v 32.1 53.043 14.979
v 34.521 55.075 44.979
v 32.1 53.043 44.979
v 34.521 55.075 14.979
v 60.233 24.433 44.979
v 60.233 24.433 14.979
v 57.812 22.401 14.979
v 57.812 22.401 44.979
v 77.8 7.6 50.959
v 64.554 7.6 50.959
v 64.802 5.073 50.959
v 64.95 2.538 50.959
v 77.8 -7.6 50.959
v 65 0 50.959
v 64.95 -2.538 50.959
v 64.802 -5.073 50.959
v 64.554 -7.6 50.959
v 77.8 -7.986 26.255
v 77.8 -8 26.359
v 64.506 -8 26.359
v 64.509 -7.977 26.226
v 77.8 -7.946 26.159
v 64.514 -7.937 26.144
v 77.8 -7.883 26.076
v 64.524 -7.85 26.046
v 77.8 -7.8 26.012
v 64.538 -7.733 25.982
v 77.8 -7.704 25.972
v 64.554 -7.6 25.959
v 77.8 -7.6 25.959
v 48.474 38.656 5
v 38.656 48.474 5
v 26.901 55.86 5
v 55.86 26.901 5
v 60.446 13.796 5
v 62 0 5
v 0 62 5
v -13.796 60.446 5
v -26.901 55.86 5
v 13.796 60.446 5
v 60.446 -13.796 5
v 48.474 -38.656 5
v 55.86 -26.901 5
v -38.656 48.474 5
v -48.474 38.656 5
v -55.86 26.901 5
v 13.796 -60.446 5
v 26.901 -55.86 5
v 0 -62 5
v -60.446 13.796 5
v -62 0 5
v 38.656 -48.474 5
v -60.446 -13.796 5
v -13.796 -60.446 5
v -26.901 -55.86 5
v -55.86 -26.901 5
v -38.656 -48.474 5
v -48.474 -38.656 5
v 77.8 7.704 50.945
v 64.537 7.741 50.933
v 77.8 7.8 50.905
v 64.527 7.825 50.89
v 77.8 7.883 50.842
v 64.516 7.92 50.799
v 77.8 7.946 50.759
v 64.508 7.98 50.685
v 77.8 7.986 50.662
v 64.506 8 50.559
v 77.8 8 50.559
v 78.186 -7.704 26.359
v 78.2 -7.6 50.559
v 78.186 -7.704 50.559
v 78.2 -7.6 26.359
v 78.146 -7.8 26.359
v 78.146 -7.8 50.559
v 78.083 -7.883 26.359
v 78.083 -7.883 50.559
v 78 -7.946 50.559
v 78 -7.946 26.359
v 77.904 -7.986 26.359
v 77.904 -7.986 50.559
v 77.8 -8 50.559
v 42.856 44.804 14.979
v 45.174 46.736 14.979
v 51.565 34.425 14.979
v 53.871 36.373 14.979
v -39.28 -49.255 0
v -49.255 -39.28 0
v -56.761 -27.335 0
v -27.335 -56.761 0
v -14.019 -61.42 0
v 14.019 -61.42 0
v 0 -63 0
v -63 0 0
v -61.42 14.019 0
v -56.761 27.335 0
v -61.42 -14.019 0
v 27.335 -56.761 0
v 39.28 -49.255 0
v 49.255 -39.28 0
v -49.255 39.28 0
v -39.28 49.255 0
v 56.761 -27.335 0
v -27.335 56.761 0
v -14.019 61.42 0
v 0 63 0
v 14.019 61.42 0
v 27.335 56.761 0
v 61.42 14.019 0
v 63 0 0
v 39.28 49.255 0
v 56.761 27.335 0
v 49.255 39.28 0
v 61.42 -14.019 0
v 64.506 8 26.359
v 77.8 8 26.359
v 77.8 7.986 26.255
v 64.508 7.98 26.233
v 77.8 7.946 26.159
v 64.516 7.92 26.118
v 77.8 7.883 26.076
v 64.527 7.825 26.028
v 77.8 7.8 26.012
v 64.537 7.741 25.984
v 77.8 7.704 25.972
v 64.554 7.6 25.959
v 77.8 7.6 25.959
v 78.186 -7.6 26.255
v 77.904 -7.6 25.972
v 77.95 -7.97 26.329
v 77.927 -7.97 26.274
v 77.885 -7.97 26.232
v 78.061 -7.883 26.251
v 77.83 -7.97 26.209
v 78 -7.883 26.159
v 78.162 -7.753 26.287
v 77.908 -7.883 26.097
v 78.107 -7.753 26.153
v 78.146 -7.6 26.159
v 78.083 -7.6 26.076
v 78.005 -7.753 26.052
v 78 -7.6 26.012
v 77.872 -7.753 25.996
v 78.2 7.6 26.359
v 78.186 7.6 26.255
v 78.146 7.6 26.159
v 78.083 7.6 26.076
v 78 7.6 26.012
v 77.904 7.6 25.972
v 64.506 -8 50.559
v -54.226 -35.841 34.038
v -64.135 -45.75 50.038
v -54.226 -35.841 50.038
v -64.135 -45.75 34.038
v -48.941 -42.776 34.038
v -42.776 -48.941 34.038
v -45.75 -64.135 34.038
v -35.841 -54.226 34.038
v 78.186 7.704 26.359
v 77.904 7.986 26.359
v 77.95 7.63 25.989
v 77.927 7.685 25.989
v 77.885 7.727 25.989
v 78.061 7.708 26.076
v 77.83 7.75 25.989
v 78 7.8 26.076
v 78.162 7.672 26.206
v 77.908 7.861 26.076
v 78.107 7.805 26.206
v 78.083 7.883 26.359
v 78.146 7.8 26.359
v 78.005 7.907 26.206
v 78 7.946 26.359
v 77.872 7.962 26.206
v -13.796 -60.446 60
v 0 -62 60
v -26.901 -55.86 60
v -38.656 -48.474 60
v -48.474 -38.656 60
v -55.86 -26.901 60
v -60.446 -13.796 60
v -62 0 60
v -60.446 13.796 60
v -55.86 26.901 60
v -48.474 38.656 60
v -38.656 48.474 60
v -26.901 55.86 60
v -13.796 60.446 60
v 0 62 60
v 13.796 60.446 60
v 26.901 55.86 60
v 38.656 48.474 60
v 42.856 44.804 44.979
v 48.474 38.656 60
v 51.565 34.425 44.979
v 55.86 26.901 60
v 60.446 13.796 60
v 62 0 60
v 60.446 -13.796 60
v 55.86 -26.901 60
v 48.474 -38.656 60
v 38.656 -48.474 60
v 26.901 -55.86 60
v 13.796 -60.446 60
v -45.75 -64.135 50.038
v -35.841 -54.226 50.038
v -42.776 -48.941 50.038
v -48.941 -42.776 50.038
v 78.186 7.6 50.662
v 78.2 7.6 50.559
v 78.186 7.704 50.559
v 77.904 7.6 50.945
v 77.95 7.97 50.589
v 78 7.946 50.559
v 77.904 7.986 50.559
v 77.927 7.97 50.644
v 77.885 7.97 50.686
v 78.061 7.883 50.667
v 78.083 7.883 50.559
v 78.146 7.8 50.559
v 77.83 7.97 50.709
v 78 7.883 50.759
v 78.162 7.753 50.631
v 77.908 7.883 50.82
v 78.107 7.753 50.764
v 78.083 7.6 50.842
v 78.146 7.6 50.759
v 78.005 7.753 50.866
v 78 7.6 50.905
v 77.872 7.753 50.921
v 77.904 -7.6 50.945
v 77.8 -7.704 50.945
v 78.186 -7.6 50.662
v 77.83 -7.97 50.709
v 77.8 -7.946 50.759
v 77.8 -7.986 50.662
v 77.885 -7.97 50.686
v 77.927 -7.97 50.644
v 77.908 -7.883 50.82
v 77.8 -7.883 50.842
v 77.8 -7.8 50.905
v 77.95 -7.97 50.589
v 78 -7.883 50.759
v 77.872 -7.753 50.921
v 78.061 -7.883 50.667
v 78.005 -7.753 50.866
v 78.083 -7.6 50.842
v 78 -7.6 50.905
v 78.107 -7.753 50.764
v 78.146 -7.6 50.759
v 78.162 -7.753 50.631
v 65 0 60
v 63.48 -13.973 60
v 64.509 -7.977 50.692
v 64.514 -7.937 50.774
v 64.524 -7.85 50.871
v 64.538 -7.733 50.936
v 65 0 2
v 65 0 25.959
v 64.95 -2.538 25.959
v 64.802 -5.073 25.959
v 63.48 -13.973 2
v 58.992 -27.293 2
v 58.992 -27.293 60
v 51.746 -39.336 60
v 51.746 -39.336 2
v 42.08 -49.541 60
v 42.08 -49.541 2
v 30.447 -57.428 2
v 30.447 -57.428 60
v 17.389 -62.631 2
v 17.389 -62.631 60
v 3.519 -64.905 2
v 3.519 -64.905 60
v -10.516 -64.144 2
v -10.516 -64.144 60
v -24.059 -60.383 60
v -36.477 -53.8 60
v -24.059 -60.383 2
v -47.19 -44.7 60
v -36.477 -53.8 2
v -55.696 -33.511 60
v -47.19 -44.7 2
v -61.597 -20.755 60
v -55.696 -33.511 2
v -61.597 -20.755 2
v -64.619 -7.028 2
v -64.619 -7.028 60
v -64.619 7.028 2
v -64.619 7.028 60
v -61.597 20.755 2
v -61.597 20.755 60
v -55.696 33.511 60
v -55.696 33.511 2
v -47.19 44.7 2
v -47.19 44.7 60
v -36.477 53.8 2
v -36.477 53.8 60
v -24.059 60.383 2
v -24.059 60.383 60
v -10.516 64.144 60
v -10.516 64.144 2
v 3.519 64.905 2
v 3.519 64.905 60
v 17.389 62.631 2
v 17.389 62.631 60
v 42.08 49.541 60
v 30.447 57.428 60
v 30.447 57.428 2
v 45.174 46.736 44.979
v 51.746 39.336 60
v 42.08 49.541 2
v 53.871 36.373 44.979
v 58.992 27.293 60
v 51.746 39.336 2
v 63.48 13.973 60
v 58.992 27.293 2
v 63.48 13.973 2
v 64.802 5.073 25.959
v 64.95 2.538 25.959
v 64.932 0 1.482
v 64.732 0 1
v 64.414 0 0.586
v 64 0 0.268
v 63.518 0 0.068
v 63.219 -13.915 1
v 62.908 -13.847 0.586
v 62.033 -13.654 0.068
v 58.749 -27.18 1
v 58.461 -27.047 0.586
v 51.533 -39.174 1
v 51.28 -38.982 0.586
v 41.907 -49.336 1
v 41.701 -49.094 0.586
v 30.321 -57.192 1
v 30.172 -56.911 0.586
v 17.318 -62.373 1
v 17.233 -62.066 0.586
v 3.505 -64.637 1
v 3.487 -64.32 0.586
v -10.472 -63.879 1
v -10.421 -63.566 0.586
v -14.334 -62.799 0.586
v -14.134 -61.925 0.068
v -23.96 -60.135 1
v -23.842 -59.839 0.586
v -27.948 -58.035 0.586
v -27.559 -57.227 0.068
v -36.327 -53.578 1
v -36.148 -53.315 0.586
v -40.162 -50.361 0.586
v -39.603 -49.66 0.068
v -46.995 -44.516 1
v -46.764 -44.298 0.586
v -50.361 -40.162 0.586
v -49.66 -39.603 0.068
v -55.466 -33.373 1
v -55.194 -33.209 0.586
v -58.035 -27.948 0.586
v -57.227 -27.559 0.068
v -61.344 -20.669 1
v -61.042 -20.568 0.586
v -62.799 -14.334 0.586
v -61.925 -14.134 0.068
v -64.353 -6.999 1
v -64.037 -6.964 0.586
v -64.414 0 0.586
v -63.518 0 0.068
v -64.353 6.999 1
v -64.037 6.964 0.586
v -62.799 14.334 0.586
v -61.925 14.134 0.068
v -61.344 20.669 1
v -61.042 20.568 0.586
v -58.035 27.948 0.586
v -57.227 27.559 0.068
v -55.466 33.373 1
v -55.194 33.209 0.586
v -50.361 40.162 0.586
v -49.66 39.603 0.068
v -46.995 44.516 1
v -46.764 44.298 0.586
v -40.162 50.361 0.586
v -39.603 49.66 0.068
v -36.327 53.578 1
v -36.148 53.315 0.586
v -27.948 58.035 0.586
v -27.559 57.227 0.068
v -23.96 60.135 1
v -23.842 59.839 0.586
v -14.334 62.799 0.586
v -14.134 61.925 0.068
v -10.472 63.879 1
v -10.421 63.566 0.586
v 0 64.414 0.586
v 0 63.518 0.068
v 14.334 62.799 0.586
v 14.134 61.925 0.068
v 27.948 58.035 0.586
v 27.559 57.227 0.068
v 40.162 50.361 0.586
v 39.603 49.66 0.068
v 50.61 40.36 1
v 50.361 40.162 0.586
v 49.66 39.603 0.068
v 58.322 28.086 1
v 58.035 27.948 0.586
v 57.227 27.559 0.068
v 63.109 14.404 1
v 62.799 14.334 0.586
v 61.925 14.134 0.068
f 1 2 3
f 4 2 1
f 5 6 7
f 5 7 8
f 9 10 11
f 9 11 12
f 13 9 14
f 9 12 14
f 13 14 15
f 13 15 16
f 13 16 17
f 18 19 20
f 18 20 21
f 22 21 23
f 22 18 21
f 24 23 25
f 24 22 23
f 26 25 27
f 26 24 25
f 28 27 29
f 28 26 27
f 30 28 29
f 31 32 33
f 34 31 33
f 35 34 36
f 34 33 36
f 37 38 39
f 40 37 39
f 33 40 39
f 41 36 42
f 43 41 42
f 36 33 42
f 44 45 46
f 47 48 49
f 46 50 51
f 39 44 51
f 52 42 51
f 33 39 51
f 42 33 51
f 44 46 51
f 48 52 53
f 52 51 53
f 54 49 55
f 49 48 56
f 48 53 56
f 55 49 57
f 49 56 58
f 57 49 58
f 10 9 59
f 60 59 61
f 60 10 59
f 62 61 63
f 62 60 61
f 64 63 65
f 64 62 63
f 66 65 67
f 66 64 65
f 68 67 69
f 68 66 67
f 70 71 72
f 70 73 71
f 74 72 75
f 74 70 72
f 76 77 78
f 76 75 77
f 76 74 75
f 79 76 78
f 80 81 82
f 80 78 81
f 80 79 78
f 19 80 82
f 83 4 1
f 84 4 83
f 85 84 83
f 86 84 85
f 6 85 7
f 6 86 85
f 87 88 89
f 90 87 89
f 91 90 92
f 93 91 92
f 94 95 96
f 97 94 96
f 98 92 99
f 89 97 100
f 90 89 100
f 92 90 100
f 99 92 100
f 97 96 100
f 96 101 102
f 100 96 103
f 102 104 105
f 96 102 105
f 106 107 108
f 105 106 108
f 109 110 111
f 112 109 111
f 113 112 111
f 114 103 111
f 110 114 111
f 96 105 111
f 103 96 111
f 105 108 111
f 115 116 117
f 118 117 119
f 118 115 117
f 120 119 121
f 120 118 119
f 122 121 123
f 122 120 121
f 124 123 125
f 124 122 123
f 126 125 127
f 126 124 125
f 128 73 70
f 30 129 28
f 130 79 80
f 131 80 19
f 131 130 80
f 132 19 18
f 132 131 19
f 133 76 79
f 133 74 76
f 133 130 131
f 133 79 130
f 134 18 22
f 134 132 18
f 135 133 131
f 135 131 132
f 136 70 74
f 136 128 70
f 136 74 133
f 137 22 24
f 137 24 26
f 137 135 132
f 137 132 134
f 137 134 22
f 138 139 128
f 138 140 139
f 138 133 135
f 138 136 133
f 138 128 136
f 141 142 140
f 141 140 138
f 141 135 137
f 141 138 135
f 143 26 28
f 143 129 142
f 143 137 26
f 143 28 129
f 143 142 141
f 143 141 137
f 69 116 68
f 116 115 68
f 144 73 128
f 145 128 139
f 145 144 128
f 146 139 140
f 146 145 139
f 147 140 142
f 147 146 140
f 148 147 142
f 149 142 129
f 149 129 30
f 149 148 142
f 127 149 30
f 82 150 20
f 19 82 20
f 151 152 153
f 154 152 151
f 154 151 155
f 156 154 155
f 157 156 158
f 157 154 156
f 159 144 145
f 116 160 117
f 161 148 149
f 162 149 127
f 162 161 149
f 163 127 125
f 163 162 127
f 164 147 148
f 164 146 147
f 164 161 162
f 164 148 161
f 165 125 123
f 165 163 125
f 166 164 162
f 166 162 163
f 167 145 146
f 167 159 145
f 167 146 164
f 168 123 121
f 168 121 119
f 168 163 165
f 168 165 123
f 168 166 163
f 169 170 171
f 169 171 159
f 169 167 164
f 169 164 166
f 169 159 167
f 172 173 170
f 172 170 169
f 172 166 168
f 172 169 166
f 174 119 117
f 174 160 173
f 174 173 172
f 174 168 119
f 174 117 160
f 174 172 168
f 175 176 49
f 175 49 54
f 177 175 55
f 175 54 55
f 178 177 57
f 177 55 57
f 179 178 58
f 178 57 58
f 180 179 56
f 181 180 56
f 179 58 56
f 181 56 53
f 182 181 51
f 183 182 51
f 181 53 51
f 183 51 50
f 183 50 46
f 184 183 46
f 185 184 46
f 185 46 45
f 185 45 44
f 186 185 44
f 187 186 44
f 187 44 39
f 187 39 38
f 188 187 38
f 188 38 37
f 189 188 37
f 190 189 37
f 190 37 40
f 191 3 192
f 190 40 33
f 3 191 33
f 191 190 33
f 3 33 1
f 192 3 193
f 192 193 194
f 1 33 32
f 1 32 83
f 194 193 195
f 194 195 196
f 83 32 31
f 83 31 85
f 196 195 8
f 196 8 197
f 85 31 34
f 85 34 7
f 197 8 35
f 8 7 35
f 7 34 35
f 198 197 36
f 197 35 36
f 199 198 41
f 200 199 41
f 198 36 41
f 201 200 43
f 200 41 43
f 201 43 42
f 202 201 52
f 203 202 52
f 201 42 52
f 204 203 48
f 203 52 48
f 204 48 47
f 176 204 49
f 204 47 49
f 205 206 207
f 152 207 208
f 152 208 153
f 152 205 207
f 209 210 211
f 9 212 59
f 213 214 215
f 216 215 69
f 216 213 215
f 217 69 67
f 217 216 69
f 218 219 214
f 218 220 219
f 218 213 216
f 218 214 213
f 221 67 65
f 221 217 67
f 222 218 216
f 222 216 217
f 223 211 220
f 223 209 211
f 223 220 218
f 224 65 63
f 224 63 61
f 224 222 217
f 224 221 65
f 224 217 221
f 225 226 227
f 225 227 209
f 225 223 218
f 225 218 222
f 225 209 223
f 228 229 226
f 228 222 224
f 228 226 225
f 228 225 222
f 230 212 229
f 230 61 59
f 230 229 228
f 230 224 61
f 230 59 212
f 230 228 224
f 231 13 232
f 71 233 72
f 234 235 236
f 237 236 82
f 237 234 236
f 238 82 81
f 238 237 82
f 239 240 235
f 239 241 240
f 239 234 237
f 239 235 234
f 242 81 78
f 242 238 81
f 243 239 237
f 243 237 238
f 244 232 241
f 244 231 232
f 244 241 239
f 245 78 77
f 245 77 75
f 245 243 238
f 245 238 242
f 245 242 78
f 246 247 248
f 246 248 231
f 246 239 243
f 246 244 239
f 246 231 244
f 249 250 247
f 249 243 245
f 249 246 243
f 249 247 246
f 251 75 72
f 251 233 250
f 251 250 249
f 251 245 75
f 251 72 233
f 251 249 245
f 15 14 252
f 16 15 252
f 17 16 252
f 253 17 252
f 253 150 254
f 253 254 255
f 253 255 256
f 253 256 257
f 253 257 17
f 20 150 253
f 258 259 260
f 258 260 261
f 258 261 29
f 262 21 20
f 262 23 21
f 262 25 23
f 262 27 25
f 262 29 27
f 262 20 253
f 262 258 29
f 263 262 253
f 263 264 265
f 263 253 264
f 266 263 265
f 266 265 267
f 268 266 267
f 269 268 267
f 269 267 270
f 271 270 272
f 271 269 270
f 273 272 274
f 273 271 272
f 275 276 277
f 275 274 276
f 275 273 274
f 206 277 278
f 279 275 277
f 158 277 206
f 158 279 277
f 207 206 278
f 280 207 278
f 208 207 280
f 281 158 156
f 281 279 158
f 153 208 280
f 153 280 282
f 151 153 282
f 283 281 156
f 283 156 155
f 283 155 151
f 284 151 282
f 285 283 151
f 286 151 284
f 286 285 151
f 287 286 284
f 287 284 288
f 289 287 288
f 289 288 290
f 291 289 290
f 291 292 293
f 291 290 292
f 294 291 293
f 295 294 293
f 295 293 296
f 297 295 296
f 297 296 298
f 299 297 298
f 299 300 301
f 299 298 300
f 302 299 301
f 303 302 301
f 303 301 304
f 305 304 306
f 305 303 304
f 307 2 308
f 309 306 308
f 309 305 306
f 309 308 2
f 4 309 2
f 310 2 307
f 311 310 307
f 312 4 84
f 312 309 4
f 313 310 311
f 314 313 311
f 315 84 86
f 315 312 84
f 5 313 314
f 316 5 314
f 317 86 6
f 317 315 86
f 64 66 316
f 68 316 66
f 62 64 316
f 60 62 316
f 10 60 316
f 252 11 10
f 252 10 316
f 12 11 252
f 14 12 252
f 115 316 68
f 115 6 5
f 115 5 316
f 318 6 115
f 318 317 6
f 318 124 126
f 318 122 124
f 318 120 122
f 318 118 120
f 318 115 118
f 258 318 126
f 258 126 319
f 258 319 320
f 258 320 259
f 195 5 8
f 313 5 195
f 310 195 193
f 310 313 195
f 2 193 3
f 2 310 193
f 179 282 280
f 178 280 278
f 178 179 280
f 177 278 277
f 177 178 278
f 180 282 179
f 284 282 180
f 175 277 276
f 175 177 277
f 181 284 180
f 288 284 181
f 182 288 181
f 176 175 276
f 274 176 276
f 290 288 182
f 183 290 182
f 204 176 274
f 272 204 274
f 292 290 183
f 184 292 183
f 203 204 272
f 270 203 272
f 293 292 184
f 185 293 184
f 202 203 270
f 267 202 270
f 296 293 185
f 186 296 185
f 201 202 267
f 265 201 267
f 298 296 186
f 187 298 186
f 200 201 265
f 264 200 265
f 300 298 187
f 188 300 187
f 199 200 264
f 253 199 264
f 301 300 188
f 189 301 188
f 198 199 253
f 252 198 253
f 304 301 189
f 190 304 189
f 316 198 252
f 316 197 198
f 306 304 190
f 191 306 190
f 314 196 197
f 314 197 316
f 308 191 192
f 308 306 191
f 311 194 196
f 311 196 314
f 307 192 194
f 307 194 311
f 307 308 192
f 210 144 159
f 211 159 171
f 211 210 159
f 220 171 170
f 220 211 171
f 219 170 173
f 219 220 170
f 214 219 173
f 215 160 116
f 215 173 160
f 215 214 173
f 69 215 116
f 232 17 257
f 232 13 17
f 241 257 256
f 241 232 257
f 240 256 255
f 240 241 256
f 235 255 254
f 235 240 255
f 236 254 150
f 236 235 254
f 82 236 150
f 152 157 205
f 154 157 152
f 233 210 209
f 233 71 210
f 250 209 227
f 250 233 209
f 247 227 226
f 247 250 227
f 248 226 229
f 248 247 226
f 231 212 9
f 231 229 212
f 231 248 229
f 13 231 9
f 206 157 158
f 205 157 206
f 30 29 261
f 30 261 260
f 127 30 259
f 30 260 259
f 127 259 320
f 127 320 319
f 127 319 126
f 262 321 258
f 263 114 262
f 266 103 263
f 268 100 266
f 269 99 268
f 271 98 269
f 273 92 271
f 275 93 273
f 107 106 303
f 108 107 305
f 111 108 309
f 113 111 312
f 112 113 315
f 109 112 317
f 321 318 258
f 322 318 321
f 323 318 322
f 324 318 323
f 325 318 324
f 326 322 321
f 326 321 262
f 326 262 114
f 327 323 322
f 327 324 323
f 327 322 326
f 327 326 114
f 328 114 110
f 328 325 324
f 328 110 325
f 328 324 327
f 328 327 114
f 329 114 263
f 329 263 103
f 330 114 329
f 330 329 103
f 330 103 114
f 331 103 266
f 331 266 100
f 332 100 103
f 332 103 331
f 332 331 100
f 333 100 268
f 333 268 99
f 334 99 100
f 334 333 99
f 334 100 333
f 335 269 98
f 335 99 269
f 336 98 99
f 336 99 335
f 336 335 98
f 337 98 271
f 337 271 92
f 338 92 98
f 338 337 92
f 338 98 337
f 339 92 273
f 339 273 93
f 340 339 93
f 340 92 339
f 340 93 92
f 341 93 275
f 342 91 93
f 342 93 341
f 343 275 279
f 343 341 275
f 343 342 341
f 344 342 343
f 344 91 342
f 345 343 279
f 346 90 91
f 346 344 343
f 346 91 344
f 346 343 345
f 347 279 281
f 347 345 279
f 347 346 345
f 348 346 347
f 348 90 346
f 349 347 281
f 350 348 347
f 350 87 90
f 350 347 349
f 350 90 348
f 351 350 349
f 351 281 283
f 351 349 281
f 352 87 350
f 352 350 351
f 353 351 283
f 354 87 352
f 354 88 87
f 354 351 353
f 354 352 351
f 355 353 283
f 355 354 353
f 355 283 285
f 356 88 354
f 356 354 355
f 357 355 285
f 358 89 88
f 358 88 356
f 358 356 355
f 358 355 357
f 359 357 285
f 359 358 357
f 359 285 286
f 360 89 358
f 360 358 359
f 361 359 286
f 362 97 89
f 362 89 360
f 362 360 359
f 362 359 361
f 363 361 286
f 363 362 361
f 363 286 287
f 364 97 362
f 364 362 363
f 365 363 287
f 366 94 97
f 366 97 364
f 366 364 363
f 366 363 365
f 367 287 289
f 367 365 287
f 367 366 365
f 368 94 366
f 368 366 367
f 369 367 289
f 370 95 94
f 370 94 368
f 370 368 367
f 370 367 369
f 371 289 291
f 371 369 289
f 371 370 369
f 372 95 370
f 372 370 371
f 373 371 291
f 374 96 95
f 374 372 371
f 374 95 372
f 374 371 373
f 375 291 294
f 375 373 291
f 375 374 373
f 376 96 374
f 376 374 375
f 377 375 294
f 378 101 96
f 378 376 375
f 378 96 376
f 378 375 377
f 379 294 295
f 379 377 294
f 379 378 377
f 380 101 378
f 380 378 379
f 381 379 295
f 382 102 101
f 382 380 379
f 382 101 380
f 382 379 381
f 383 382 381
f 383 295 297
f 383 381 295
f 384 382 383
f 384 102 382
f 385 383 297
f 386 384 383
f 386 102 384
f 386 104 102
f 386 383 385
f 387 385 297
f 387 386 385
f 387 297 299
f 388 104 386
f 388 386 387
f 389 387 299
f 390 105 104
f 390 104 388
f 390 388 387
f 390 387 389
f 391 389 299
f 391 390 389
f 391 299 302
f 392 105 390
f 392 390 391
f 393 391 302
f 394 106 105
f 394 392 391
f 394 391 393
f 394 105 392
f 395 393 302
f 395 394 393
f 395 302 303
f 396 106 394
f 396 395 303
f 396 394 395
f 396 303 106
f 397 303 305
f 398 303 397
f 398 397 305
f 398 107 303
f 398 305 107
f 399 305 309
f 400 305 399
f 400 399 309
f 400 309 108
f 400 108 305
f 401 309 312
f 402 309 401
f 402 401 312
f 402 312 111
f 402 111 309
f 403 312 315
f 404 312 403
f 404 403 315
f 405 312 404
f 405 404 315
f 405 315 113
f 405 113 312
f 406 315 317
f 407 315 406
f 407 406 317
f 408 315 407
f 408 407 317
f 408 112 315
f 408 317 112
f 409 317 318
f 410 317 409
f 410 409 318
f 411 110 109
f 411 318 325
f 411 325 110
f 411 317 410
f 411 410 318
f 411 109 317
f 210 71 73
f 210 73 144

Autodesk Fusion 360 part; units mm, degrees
sketch "Sketch1" plane through (0, 0, 0) normal (0, 0, 1) x (1, 0, 0)
  circle A0 centre (0, 0) radius 65
  dimension "d1" = 130
extrude "Extrude1" add sketch "Sketch1" along normal blind 60
hole "Hole1" at (0, 0, 60) direction (0, 0, -1) diameter 124 depth 55 tip angle 180
ref_plane "WorkPlane1" through (65, 0, 32.9588) normal (1, 0, 0) x (0, -1, 0)
ref_plane "WorkPlane2" through (77.5, 0, 32.9588) normal (1, 0, 0) x (0, -1, 0)
sketch "Sketch2" plane through (77.5, 0, 32.9588) normal (1, 0, 0) x (0, 1, 0)
  line L0 (-8, -8) -> (8, -8)
  line L1 (8, -8) -> (8, 18)
  line L2 (8, 18) -> (-8, 18)
  line L3 (-8, 18) -> (-8, -8)
  line L4 (-8, -8) -> (8, 18) construction
  line L5 (8, -8) -> (-8, 18) construction
  point P0 (0, 5)
  dimension "d9" = 16
extrude "Extrude2" add sketch "Sketch2" along normal up to surface end surface at (64.677, -6.4719, 40)
extrude "Extrude3" add 1 faces at (77.5, -2.6667, 33.6254) along direction (1, 0, 0) blind 0.5
extrude "Extrude4" cut 1 faces at (73.6667, 0, 24.9588) along direction (0, 0, 1) blind 1
extrude "Extrude5" add 1 faces at (78, -2.6667, 42.6254) along direction (1, 0, 0) blind 0.2
shell "Shell1" thickness 1 removed faces 2 at (69.0705, 8, 34.2921) at (73.8, 0, 50.9588)
ref_plane "WorkPlane3" through (49.7929, 41.7812, 24.979) normal (0.766, 0.6428, 0) x (0.6428, -0.766, 0)
sketch "Sketch3" plane through (49.7929, 41.7812, 24.979) normal (0.766, 0.6428, 0) x (0.6428, -0.766, 0)
  line L0 (20, -20) -> (-20, -20)
  line L1 (-20, -20) -> (-20, 10)
  line L2 (-20, 10) -> (20, 10)
  line L3 (20, 10) -> (20, -20)
  line L4 (20, -20) -> (-20, 10) construction
  line L5 (-20, -20) -> (20, 10) construction
  point P0 (0, -5)
  dimension "d20" = 40
extrude "Extrude6" cut sketch "Sketch3" against normal blind 20
fillet "Fillet1" radius 0.4 8 edges at (78.2, 0, 50.9588) (77.7, 8, 50.9588) (78.2, 8, 38.4588) (71.3529, 8, 25.9588) (78.2, 0, 25.9588) (78.2, -8, 38.4588) (71.3529, -8, 50.9588) (71.3529, -8, 25.9588)
fillet "Fillet2" radius 2 1 edges at (-60.6013, -23.505, 0)
ref_plane "WorkPlane4" through (49.7929, 41.7812, 24.979) normal (0.766, 0.6428, 0) x (0.6428, -0.766, 0)
ref_plane "WorkPlane5" through (-45.9619, -45.9619, 2.3267) normal (-0.7071, -0.7071, 0) x (-0.7071, 0.7071, 0)
ref_plane "WorkPlane6" through (-55.2958, -55.2958, 2.3267) normal (-0.7071, -0.7071, 0) x (-0.7071, 0.7071, 0)
sketch "Sketch4" plane through (-55.2958, -55.2958, 2.3267) normal (-0.7071, -0.7071, 0) x (-0.7071, 0.7071, 0)
  line L0 (13, -31.7116) -> (-13, -31.7116)
  line L1 (-13, -31.7116) -> (-13, -47.7116)
  line L2 (-13, -47.7116) -> (13, -47.7116)
  line L3 (13, -47.7116) -> (13, -31.7116)
  line L4 (13, -31.7116) -> (-13, -47.7116) construction
  line L5 (-13, -31.7116) -> (13, -47.7116) construction
  point P0 (0, -39.7116)
  dimension "d31" = 26
  dimension "d32" = 16
extrude "Extrude7" add sketch "Sketch4" along normal up to surface end surface at (62.1344, 19.0871, 28.7723)
extrude "Extrude8" cut 1 faces at (-52.2316, -58.3599, 39.3716) along direction (0.707107, 0.707107, 0) blind 0.5
shell "Shell2" thickness 1 removed faces 1 at (-52.9418, -50.8867, 50.0383)
